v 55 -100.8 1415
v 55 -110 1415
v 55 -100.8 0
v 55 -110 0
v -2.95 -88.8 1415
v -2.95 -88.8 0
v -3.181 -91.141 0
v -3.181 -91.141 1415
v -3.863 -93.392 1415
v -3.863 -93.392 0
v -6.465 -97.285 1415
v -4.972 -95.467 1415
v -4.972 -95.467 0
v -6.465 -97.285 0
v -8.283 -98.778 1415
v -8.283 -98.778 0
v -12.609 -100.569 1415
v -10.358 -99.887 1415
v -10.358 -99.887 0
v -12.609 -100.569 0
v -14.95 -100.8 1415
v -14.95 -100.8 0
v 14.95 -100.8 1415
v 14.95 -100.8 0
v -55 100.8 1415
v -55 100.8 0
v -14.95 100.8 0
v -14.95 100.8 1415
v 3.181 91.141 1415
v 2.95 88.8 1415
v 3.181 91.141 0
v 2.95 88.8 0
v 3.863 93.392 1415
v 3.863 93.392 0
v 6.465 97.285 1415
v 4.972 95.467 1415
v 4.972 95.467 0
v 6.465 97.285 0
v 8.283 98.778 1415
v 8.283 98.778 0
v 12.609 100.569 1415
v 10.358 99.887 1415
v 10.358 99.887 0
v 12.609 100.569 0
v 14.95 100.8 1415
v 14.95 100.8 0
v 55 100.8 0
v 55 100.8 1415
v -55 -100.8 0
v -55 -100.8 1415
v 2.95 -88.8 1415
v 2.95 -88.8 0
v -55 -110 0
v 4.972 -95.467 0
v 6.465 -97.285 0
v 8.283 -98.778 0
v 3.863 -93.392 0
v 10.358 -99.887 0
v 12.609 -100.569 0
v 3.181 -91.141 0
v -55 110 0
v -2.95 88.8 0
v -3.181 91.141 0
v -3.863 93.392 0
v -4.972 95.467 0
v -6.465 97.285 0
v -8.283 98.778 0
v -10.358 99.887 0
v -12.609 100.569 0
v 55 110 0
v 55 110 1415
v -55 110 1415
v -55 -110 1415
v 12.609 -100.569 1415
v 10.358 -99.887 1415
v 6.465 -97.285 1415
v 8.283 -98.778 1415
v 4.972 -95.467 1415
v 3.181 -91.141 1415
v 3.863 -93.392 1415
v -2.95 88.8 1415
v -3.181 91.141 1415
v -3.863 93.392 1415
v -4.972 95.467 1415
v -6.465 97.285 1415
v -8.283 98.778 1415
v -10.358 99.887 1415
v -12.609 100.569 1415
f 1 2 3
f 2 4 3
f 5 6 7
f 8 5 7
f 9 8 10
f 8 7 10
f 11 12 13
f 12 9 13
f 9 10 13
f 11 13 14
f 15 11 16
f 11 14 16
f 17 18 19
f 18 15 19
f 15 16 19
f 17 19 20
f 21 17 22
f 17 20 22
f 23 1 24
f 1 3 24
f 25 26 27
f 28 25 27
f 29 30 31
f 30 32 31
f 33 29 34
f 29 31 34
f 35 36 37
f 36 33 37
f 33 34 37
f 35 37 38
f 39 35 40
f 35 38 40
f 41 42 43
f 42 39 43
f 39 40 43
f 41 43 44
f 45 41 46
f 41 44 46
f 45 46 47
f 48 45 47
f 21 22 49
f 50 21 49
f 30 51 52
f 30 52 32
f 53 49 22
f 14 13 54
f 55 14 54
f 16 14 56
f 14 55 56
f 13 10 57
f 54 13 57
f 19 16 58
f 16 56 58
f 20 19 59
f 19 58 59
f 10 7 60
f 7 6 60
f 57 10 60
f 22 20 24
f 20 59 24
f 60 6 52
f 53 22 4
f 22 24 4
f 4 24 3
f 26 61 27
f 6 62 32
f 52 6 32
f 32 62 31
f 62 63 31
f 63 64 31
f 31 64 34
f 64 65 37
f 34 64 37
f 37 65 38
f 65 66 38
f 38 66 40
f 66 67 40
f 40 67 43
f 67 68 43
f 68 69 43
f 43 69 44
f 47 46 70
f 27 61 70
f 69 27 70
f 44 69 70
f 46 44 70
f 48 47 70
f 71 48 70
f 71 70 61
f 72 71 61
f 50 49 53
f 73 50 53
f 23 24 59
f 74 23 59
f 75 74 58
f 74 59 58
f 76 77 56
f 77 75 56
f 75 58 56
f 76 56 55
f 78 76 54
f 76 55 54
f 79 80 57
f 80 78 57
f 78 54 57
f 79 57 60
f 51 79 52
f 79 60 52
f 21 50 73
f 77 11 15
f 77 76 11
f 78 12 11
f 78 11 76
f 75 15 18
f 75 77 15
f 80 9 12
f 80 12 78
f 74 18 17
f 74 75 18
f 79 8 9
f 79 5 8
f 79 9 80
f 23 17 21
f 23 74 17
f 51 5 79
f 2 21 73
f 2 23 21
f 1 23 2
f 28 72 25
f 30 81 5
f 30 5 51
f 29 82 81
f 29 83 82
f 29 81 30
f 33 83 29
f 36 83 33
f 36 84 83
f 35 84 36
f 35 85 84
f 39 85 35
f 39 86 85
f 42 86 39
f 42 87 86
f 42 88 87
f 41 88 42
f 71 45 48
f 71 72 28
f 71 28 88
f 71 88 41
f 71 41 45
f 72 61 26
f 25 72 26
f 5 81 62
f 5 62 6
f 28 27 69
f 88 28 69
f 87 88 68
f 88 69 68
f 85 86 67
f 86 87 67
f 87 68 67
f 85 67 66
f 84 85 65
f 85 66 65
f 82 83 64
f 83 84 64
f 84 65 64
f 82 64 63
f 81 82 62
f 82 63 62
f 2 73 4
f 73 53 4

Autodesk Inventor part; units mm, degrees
ref_plane "Start plane" through (0, 0, 0) normal (0, 0, 1) x (1, 0, 0)
ref_plane "End plane" through (0, 0, 1415) normal (0, 0, 1) x (1, 0, 0)
sketch "Sketch2" plane through (0, 0, 0) normal (0, 0, 1) x (1, 0, 0)
  line L0 (-55, 100.8) -> (-14.95, 100.8)
  line L1 (-55, 110) -> (-55, 100.8)
  line L2 (55, 110) -> (-55, 110)
  line L3 (55, 100.8) -> (55, 110)
  line L4 (14.95, 100.8) -> (55, 100.8)
  line L5 (2.95, -88.8) -> (2.95, 88.8)
  line L6 (55, -100.8) -> (14.95, -100.8)
  line L7 (55, -110) -> (55, -100.8)
  line L8 (-55, -100.8) -> (-55, -110)
  line L9 (-14.95, -100.8) -> (-55, -100.8)
  line L10 (-2.95, 88.8) -> (-2.95, -88.8)
  line L11 (0, -154) -> (0, 154) construction
  line L12 (-2.95, -100.8) -> (2.95, -100.8) construction
  arc A0 (-14.95, -100.8) -> (-2.95, -88.8) centre (-14.95, -88.8) ccw
  arc A1 (-2.95, 88.8) -> (-14.95, 100.8) centre (-14.95, 88.8) ccw
  arc A2 (14.95, 100.8) -> (2.95, 88.8) centre (14.95, 88.8) ccw
  arc A3 (2.95, -88.8) -> (14.95, -100.8) centre (14.95, -88.8) ccw
  line L13 (-77, 0) -> (77, 0) construction
  line L14 (-55, -110) -> (55, -110)
  point P0 (-2.95, 100.8)
  point P1 (2.95, 100.8)
  point P2 (0, 0)
  point P3 (0, -100.8)
  point P4 (0, 0)
  dimension "d1" = 220
  dimension "d3" = 9.2
  dimension "d5" = 5.9
  dimension "d7" = 110
  dimension "d13" = 12
  dimension "d14" = 110
  dimension "d15" = 55
extrude "Body" add sketch "Sketch2" along normal up to surface (1415 mm away) from surface at 0
sketch "Sketch3" plane through (0, 0, 0) normal (0, 0, 1) x (1, 0, 0)
  line L0 (0, 0) -> (10, 0)
ref_plane "Work Plane3" through (0, 0, 0) normal (0, -1, 0) x (1, 0, 0)
ref_plane "Work Plane4" through (0, -4000, 1415) normal (0, 0, 1) x (1, 0, 0)
split "Split1" plane through (0, -4000, 1415) removes the side toward (0, 0, 1)
sketch "Sketch4" plane through (0, 0, 0) normal (0, -1, 0) x (1, 0, 0)
  line L0 (-2, 0) -> (12, 0) projected
  line L1 (-2, 1415) -> (12, 1415) projected
  dimension "d19" = 1415
equation "\"d1\" = ParH"
equation "\"d3\" = t2"
equation "\"d5\" = t1"
equation "\"d7\" = b"
equation "\"d13\" = R1"
equation "\"d14\" = 0.5 * d1"
equation "\"d15\" = 0.5 * d7"
equation "\"d8\" = G_L"
equation "\"b\" = 110"
equation "\"ParH\" = 220"
equation "\"R1\" = 12"
equation "\"G_L\" = d19"
equation "\"t1\" = 5.9"
equation "\"t2\" = 9.2"
equation "\"G_OFFSET_START\" = 0"
equation "\"G_OFFSET_END\" = -85"
equation "\"d17\" = G_OFFSET_END + B_L"
equation "\"B_L\" = 1500"
properties part number "DIN 1025 - IPE 220-1415" material "Steel, Mild"
